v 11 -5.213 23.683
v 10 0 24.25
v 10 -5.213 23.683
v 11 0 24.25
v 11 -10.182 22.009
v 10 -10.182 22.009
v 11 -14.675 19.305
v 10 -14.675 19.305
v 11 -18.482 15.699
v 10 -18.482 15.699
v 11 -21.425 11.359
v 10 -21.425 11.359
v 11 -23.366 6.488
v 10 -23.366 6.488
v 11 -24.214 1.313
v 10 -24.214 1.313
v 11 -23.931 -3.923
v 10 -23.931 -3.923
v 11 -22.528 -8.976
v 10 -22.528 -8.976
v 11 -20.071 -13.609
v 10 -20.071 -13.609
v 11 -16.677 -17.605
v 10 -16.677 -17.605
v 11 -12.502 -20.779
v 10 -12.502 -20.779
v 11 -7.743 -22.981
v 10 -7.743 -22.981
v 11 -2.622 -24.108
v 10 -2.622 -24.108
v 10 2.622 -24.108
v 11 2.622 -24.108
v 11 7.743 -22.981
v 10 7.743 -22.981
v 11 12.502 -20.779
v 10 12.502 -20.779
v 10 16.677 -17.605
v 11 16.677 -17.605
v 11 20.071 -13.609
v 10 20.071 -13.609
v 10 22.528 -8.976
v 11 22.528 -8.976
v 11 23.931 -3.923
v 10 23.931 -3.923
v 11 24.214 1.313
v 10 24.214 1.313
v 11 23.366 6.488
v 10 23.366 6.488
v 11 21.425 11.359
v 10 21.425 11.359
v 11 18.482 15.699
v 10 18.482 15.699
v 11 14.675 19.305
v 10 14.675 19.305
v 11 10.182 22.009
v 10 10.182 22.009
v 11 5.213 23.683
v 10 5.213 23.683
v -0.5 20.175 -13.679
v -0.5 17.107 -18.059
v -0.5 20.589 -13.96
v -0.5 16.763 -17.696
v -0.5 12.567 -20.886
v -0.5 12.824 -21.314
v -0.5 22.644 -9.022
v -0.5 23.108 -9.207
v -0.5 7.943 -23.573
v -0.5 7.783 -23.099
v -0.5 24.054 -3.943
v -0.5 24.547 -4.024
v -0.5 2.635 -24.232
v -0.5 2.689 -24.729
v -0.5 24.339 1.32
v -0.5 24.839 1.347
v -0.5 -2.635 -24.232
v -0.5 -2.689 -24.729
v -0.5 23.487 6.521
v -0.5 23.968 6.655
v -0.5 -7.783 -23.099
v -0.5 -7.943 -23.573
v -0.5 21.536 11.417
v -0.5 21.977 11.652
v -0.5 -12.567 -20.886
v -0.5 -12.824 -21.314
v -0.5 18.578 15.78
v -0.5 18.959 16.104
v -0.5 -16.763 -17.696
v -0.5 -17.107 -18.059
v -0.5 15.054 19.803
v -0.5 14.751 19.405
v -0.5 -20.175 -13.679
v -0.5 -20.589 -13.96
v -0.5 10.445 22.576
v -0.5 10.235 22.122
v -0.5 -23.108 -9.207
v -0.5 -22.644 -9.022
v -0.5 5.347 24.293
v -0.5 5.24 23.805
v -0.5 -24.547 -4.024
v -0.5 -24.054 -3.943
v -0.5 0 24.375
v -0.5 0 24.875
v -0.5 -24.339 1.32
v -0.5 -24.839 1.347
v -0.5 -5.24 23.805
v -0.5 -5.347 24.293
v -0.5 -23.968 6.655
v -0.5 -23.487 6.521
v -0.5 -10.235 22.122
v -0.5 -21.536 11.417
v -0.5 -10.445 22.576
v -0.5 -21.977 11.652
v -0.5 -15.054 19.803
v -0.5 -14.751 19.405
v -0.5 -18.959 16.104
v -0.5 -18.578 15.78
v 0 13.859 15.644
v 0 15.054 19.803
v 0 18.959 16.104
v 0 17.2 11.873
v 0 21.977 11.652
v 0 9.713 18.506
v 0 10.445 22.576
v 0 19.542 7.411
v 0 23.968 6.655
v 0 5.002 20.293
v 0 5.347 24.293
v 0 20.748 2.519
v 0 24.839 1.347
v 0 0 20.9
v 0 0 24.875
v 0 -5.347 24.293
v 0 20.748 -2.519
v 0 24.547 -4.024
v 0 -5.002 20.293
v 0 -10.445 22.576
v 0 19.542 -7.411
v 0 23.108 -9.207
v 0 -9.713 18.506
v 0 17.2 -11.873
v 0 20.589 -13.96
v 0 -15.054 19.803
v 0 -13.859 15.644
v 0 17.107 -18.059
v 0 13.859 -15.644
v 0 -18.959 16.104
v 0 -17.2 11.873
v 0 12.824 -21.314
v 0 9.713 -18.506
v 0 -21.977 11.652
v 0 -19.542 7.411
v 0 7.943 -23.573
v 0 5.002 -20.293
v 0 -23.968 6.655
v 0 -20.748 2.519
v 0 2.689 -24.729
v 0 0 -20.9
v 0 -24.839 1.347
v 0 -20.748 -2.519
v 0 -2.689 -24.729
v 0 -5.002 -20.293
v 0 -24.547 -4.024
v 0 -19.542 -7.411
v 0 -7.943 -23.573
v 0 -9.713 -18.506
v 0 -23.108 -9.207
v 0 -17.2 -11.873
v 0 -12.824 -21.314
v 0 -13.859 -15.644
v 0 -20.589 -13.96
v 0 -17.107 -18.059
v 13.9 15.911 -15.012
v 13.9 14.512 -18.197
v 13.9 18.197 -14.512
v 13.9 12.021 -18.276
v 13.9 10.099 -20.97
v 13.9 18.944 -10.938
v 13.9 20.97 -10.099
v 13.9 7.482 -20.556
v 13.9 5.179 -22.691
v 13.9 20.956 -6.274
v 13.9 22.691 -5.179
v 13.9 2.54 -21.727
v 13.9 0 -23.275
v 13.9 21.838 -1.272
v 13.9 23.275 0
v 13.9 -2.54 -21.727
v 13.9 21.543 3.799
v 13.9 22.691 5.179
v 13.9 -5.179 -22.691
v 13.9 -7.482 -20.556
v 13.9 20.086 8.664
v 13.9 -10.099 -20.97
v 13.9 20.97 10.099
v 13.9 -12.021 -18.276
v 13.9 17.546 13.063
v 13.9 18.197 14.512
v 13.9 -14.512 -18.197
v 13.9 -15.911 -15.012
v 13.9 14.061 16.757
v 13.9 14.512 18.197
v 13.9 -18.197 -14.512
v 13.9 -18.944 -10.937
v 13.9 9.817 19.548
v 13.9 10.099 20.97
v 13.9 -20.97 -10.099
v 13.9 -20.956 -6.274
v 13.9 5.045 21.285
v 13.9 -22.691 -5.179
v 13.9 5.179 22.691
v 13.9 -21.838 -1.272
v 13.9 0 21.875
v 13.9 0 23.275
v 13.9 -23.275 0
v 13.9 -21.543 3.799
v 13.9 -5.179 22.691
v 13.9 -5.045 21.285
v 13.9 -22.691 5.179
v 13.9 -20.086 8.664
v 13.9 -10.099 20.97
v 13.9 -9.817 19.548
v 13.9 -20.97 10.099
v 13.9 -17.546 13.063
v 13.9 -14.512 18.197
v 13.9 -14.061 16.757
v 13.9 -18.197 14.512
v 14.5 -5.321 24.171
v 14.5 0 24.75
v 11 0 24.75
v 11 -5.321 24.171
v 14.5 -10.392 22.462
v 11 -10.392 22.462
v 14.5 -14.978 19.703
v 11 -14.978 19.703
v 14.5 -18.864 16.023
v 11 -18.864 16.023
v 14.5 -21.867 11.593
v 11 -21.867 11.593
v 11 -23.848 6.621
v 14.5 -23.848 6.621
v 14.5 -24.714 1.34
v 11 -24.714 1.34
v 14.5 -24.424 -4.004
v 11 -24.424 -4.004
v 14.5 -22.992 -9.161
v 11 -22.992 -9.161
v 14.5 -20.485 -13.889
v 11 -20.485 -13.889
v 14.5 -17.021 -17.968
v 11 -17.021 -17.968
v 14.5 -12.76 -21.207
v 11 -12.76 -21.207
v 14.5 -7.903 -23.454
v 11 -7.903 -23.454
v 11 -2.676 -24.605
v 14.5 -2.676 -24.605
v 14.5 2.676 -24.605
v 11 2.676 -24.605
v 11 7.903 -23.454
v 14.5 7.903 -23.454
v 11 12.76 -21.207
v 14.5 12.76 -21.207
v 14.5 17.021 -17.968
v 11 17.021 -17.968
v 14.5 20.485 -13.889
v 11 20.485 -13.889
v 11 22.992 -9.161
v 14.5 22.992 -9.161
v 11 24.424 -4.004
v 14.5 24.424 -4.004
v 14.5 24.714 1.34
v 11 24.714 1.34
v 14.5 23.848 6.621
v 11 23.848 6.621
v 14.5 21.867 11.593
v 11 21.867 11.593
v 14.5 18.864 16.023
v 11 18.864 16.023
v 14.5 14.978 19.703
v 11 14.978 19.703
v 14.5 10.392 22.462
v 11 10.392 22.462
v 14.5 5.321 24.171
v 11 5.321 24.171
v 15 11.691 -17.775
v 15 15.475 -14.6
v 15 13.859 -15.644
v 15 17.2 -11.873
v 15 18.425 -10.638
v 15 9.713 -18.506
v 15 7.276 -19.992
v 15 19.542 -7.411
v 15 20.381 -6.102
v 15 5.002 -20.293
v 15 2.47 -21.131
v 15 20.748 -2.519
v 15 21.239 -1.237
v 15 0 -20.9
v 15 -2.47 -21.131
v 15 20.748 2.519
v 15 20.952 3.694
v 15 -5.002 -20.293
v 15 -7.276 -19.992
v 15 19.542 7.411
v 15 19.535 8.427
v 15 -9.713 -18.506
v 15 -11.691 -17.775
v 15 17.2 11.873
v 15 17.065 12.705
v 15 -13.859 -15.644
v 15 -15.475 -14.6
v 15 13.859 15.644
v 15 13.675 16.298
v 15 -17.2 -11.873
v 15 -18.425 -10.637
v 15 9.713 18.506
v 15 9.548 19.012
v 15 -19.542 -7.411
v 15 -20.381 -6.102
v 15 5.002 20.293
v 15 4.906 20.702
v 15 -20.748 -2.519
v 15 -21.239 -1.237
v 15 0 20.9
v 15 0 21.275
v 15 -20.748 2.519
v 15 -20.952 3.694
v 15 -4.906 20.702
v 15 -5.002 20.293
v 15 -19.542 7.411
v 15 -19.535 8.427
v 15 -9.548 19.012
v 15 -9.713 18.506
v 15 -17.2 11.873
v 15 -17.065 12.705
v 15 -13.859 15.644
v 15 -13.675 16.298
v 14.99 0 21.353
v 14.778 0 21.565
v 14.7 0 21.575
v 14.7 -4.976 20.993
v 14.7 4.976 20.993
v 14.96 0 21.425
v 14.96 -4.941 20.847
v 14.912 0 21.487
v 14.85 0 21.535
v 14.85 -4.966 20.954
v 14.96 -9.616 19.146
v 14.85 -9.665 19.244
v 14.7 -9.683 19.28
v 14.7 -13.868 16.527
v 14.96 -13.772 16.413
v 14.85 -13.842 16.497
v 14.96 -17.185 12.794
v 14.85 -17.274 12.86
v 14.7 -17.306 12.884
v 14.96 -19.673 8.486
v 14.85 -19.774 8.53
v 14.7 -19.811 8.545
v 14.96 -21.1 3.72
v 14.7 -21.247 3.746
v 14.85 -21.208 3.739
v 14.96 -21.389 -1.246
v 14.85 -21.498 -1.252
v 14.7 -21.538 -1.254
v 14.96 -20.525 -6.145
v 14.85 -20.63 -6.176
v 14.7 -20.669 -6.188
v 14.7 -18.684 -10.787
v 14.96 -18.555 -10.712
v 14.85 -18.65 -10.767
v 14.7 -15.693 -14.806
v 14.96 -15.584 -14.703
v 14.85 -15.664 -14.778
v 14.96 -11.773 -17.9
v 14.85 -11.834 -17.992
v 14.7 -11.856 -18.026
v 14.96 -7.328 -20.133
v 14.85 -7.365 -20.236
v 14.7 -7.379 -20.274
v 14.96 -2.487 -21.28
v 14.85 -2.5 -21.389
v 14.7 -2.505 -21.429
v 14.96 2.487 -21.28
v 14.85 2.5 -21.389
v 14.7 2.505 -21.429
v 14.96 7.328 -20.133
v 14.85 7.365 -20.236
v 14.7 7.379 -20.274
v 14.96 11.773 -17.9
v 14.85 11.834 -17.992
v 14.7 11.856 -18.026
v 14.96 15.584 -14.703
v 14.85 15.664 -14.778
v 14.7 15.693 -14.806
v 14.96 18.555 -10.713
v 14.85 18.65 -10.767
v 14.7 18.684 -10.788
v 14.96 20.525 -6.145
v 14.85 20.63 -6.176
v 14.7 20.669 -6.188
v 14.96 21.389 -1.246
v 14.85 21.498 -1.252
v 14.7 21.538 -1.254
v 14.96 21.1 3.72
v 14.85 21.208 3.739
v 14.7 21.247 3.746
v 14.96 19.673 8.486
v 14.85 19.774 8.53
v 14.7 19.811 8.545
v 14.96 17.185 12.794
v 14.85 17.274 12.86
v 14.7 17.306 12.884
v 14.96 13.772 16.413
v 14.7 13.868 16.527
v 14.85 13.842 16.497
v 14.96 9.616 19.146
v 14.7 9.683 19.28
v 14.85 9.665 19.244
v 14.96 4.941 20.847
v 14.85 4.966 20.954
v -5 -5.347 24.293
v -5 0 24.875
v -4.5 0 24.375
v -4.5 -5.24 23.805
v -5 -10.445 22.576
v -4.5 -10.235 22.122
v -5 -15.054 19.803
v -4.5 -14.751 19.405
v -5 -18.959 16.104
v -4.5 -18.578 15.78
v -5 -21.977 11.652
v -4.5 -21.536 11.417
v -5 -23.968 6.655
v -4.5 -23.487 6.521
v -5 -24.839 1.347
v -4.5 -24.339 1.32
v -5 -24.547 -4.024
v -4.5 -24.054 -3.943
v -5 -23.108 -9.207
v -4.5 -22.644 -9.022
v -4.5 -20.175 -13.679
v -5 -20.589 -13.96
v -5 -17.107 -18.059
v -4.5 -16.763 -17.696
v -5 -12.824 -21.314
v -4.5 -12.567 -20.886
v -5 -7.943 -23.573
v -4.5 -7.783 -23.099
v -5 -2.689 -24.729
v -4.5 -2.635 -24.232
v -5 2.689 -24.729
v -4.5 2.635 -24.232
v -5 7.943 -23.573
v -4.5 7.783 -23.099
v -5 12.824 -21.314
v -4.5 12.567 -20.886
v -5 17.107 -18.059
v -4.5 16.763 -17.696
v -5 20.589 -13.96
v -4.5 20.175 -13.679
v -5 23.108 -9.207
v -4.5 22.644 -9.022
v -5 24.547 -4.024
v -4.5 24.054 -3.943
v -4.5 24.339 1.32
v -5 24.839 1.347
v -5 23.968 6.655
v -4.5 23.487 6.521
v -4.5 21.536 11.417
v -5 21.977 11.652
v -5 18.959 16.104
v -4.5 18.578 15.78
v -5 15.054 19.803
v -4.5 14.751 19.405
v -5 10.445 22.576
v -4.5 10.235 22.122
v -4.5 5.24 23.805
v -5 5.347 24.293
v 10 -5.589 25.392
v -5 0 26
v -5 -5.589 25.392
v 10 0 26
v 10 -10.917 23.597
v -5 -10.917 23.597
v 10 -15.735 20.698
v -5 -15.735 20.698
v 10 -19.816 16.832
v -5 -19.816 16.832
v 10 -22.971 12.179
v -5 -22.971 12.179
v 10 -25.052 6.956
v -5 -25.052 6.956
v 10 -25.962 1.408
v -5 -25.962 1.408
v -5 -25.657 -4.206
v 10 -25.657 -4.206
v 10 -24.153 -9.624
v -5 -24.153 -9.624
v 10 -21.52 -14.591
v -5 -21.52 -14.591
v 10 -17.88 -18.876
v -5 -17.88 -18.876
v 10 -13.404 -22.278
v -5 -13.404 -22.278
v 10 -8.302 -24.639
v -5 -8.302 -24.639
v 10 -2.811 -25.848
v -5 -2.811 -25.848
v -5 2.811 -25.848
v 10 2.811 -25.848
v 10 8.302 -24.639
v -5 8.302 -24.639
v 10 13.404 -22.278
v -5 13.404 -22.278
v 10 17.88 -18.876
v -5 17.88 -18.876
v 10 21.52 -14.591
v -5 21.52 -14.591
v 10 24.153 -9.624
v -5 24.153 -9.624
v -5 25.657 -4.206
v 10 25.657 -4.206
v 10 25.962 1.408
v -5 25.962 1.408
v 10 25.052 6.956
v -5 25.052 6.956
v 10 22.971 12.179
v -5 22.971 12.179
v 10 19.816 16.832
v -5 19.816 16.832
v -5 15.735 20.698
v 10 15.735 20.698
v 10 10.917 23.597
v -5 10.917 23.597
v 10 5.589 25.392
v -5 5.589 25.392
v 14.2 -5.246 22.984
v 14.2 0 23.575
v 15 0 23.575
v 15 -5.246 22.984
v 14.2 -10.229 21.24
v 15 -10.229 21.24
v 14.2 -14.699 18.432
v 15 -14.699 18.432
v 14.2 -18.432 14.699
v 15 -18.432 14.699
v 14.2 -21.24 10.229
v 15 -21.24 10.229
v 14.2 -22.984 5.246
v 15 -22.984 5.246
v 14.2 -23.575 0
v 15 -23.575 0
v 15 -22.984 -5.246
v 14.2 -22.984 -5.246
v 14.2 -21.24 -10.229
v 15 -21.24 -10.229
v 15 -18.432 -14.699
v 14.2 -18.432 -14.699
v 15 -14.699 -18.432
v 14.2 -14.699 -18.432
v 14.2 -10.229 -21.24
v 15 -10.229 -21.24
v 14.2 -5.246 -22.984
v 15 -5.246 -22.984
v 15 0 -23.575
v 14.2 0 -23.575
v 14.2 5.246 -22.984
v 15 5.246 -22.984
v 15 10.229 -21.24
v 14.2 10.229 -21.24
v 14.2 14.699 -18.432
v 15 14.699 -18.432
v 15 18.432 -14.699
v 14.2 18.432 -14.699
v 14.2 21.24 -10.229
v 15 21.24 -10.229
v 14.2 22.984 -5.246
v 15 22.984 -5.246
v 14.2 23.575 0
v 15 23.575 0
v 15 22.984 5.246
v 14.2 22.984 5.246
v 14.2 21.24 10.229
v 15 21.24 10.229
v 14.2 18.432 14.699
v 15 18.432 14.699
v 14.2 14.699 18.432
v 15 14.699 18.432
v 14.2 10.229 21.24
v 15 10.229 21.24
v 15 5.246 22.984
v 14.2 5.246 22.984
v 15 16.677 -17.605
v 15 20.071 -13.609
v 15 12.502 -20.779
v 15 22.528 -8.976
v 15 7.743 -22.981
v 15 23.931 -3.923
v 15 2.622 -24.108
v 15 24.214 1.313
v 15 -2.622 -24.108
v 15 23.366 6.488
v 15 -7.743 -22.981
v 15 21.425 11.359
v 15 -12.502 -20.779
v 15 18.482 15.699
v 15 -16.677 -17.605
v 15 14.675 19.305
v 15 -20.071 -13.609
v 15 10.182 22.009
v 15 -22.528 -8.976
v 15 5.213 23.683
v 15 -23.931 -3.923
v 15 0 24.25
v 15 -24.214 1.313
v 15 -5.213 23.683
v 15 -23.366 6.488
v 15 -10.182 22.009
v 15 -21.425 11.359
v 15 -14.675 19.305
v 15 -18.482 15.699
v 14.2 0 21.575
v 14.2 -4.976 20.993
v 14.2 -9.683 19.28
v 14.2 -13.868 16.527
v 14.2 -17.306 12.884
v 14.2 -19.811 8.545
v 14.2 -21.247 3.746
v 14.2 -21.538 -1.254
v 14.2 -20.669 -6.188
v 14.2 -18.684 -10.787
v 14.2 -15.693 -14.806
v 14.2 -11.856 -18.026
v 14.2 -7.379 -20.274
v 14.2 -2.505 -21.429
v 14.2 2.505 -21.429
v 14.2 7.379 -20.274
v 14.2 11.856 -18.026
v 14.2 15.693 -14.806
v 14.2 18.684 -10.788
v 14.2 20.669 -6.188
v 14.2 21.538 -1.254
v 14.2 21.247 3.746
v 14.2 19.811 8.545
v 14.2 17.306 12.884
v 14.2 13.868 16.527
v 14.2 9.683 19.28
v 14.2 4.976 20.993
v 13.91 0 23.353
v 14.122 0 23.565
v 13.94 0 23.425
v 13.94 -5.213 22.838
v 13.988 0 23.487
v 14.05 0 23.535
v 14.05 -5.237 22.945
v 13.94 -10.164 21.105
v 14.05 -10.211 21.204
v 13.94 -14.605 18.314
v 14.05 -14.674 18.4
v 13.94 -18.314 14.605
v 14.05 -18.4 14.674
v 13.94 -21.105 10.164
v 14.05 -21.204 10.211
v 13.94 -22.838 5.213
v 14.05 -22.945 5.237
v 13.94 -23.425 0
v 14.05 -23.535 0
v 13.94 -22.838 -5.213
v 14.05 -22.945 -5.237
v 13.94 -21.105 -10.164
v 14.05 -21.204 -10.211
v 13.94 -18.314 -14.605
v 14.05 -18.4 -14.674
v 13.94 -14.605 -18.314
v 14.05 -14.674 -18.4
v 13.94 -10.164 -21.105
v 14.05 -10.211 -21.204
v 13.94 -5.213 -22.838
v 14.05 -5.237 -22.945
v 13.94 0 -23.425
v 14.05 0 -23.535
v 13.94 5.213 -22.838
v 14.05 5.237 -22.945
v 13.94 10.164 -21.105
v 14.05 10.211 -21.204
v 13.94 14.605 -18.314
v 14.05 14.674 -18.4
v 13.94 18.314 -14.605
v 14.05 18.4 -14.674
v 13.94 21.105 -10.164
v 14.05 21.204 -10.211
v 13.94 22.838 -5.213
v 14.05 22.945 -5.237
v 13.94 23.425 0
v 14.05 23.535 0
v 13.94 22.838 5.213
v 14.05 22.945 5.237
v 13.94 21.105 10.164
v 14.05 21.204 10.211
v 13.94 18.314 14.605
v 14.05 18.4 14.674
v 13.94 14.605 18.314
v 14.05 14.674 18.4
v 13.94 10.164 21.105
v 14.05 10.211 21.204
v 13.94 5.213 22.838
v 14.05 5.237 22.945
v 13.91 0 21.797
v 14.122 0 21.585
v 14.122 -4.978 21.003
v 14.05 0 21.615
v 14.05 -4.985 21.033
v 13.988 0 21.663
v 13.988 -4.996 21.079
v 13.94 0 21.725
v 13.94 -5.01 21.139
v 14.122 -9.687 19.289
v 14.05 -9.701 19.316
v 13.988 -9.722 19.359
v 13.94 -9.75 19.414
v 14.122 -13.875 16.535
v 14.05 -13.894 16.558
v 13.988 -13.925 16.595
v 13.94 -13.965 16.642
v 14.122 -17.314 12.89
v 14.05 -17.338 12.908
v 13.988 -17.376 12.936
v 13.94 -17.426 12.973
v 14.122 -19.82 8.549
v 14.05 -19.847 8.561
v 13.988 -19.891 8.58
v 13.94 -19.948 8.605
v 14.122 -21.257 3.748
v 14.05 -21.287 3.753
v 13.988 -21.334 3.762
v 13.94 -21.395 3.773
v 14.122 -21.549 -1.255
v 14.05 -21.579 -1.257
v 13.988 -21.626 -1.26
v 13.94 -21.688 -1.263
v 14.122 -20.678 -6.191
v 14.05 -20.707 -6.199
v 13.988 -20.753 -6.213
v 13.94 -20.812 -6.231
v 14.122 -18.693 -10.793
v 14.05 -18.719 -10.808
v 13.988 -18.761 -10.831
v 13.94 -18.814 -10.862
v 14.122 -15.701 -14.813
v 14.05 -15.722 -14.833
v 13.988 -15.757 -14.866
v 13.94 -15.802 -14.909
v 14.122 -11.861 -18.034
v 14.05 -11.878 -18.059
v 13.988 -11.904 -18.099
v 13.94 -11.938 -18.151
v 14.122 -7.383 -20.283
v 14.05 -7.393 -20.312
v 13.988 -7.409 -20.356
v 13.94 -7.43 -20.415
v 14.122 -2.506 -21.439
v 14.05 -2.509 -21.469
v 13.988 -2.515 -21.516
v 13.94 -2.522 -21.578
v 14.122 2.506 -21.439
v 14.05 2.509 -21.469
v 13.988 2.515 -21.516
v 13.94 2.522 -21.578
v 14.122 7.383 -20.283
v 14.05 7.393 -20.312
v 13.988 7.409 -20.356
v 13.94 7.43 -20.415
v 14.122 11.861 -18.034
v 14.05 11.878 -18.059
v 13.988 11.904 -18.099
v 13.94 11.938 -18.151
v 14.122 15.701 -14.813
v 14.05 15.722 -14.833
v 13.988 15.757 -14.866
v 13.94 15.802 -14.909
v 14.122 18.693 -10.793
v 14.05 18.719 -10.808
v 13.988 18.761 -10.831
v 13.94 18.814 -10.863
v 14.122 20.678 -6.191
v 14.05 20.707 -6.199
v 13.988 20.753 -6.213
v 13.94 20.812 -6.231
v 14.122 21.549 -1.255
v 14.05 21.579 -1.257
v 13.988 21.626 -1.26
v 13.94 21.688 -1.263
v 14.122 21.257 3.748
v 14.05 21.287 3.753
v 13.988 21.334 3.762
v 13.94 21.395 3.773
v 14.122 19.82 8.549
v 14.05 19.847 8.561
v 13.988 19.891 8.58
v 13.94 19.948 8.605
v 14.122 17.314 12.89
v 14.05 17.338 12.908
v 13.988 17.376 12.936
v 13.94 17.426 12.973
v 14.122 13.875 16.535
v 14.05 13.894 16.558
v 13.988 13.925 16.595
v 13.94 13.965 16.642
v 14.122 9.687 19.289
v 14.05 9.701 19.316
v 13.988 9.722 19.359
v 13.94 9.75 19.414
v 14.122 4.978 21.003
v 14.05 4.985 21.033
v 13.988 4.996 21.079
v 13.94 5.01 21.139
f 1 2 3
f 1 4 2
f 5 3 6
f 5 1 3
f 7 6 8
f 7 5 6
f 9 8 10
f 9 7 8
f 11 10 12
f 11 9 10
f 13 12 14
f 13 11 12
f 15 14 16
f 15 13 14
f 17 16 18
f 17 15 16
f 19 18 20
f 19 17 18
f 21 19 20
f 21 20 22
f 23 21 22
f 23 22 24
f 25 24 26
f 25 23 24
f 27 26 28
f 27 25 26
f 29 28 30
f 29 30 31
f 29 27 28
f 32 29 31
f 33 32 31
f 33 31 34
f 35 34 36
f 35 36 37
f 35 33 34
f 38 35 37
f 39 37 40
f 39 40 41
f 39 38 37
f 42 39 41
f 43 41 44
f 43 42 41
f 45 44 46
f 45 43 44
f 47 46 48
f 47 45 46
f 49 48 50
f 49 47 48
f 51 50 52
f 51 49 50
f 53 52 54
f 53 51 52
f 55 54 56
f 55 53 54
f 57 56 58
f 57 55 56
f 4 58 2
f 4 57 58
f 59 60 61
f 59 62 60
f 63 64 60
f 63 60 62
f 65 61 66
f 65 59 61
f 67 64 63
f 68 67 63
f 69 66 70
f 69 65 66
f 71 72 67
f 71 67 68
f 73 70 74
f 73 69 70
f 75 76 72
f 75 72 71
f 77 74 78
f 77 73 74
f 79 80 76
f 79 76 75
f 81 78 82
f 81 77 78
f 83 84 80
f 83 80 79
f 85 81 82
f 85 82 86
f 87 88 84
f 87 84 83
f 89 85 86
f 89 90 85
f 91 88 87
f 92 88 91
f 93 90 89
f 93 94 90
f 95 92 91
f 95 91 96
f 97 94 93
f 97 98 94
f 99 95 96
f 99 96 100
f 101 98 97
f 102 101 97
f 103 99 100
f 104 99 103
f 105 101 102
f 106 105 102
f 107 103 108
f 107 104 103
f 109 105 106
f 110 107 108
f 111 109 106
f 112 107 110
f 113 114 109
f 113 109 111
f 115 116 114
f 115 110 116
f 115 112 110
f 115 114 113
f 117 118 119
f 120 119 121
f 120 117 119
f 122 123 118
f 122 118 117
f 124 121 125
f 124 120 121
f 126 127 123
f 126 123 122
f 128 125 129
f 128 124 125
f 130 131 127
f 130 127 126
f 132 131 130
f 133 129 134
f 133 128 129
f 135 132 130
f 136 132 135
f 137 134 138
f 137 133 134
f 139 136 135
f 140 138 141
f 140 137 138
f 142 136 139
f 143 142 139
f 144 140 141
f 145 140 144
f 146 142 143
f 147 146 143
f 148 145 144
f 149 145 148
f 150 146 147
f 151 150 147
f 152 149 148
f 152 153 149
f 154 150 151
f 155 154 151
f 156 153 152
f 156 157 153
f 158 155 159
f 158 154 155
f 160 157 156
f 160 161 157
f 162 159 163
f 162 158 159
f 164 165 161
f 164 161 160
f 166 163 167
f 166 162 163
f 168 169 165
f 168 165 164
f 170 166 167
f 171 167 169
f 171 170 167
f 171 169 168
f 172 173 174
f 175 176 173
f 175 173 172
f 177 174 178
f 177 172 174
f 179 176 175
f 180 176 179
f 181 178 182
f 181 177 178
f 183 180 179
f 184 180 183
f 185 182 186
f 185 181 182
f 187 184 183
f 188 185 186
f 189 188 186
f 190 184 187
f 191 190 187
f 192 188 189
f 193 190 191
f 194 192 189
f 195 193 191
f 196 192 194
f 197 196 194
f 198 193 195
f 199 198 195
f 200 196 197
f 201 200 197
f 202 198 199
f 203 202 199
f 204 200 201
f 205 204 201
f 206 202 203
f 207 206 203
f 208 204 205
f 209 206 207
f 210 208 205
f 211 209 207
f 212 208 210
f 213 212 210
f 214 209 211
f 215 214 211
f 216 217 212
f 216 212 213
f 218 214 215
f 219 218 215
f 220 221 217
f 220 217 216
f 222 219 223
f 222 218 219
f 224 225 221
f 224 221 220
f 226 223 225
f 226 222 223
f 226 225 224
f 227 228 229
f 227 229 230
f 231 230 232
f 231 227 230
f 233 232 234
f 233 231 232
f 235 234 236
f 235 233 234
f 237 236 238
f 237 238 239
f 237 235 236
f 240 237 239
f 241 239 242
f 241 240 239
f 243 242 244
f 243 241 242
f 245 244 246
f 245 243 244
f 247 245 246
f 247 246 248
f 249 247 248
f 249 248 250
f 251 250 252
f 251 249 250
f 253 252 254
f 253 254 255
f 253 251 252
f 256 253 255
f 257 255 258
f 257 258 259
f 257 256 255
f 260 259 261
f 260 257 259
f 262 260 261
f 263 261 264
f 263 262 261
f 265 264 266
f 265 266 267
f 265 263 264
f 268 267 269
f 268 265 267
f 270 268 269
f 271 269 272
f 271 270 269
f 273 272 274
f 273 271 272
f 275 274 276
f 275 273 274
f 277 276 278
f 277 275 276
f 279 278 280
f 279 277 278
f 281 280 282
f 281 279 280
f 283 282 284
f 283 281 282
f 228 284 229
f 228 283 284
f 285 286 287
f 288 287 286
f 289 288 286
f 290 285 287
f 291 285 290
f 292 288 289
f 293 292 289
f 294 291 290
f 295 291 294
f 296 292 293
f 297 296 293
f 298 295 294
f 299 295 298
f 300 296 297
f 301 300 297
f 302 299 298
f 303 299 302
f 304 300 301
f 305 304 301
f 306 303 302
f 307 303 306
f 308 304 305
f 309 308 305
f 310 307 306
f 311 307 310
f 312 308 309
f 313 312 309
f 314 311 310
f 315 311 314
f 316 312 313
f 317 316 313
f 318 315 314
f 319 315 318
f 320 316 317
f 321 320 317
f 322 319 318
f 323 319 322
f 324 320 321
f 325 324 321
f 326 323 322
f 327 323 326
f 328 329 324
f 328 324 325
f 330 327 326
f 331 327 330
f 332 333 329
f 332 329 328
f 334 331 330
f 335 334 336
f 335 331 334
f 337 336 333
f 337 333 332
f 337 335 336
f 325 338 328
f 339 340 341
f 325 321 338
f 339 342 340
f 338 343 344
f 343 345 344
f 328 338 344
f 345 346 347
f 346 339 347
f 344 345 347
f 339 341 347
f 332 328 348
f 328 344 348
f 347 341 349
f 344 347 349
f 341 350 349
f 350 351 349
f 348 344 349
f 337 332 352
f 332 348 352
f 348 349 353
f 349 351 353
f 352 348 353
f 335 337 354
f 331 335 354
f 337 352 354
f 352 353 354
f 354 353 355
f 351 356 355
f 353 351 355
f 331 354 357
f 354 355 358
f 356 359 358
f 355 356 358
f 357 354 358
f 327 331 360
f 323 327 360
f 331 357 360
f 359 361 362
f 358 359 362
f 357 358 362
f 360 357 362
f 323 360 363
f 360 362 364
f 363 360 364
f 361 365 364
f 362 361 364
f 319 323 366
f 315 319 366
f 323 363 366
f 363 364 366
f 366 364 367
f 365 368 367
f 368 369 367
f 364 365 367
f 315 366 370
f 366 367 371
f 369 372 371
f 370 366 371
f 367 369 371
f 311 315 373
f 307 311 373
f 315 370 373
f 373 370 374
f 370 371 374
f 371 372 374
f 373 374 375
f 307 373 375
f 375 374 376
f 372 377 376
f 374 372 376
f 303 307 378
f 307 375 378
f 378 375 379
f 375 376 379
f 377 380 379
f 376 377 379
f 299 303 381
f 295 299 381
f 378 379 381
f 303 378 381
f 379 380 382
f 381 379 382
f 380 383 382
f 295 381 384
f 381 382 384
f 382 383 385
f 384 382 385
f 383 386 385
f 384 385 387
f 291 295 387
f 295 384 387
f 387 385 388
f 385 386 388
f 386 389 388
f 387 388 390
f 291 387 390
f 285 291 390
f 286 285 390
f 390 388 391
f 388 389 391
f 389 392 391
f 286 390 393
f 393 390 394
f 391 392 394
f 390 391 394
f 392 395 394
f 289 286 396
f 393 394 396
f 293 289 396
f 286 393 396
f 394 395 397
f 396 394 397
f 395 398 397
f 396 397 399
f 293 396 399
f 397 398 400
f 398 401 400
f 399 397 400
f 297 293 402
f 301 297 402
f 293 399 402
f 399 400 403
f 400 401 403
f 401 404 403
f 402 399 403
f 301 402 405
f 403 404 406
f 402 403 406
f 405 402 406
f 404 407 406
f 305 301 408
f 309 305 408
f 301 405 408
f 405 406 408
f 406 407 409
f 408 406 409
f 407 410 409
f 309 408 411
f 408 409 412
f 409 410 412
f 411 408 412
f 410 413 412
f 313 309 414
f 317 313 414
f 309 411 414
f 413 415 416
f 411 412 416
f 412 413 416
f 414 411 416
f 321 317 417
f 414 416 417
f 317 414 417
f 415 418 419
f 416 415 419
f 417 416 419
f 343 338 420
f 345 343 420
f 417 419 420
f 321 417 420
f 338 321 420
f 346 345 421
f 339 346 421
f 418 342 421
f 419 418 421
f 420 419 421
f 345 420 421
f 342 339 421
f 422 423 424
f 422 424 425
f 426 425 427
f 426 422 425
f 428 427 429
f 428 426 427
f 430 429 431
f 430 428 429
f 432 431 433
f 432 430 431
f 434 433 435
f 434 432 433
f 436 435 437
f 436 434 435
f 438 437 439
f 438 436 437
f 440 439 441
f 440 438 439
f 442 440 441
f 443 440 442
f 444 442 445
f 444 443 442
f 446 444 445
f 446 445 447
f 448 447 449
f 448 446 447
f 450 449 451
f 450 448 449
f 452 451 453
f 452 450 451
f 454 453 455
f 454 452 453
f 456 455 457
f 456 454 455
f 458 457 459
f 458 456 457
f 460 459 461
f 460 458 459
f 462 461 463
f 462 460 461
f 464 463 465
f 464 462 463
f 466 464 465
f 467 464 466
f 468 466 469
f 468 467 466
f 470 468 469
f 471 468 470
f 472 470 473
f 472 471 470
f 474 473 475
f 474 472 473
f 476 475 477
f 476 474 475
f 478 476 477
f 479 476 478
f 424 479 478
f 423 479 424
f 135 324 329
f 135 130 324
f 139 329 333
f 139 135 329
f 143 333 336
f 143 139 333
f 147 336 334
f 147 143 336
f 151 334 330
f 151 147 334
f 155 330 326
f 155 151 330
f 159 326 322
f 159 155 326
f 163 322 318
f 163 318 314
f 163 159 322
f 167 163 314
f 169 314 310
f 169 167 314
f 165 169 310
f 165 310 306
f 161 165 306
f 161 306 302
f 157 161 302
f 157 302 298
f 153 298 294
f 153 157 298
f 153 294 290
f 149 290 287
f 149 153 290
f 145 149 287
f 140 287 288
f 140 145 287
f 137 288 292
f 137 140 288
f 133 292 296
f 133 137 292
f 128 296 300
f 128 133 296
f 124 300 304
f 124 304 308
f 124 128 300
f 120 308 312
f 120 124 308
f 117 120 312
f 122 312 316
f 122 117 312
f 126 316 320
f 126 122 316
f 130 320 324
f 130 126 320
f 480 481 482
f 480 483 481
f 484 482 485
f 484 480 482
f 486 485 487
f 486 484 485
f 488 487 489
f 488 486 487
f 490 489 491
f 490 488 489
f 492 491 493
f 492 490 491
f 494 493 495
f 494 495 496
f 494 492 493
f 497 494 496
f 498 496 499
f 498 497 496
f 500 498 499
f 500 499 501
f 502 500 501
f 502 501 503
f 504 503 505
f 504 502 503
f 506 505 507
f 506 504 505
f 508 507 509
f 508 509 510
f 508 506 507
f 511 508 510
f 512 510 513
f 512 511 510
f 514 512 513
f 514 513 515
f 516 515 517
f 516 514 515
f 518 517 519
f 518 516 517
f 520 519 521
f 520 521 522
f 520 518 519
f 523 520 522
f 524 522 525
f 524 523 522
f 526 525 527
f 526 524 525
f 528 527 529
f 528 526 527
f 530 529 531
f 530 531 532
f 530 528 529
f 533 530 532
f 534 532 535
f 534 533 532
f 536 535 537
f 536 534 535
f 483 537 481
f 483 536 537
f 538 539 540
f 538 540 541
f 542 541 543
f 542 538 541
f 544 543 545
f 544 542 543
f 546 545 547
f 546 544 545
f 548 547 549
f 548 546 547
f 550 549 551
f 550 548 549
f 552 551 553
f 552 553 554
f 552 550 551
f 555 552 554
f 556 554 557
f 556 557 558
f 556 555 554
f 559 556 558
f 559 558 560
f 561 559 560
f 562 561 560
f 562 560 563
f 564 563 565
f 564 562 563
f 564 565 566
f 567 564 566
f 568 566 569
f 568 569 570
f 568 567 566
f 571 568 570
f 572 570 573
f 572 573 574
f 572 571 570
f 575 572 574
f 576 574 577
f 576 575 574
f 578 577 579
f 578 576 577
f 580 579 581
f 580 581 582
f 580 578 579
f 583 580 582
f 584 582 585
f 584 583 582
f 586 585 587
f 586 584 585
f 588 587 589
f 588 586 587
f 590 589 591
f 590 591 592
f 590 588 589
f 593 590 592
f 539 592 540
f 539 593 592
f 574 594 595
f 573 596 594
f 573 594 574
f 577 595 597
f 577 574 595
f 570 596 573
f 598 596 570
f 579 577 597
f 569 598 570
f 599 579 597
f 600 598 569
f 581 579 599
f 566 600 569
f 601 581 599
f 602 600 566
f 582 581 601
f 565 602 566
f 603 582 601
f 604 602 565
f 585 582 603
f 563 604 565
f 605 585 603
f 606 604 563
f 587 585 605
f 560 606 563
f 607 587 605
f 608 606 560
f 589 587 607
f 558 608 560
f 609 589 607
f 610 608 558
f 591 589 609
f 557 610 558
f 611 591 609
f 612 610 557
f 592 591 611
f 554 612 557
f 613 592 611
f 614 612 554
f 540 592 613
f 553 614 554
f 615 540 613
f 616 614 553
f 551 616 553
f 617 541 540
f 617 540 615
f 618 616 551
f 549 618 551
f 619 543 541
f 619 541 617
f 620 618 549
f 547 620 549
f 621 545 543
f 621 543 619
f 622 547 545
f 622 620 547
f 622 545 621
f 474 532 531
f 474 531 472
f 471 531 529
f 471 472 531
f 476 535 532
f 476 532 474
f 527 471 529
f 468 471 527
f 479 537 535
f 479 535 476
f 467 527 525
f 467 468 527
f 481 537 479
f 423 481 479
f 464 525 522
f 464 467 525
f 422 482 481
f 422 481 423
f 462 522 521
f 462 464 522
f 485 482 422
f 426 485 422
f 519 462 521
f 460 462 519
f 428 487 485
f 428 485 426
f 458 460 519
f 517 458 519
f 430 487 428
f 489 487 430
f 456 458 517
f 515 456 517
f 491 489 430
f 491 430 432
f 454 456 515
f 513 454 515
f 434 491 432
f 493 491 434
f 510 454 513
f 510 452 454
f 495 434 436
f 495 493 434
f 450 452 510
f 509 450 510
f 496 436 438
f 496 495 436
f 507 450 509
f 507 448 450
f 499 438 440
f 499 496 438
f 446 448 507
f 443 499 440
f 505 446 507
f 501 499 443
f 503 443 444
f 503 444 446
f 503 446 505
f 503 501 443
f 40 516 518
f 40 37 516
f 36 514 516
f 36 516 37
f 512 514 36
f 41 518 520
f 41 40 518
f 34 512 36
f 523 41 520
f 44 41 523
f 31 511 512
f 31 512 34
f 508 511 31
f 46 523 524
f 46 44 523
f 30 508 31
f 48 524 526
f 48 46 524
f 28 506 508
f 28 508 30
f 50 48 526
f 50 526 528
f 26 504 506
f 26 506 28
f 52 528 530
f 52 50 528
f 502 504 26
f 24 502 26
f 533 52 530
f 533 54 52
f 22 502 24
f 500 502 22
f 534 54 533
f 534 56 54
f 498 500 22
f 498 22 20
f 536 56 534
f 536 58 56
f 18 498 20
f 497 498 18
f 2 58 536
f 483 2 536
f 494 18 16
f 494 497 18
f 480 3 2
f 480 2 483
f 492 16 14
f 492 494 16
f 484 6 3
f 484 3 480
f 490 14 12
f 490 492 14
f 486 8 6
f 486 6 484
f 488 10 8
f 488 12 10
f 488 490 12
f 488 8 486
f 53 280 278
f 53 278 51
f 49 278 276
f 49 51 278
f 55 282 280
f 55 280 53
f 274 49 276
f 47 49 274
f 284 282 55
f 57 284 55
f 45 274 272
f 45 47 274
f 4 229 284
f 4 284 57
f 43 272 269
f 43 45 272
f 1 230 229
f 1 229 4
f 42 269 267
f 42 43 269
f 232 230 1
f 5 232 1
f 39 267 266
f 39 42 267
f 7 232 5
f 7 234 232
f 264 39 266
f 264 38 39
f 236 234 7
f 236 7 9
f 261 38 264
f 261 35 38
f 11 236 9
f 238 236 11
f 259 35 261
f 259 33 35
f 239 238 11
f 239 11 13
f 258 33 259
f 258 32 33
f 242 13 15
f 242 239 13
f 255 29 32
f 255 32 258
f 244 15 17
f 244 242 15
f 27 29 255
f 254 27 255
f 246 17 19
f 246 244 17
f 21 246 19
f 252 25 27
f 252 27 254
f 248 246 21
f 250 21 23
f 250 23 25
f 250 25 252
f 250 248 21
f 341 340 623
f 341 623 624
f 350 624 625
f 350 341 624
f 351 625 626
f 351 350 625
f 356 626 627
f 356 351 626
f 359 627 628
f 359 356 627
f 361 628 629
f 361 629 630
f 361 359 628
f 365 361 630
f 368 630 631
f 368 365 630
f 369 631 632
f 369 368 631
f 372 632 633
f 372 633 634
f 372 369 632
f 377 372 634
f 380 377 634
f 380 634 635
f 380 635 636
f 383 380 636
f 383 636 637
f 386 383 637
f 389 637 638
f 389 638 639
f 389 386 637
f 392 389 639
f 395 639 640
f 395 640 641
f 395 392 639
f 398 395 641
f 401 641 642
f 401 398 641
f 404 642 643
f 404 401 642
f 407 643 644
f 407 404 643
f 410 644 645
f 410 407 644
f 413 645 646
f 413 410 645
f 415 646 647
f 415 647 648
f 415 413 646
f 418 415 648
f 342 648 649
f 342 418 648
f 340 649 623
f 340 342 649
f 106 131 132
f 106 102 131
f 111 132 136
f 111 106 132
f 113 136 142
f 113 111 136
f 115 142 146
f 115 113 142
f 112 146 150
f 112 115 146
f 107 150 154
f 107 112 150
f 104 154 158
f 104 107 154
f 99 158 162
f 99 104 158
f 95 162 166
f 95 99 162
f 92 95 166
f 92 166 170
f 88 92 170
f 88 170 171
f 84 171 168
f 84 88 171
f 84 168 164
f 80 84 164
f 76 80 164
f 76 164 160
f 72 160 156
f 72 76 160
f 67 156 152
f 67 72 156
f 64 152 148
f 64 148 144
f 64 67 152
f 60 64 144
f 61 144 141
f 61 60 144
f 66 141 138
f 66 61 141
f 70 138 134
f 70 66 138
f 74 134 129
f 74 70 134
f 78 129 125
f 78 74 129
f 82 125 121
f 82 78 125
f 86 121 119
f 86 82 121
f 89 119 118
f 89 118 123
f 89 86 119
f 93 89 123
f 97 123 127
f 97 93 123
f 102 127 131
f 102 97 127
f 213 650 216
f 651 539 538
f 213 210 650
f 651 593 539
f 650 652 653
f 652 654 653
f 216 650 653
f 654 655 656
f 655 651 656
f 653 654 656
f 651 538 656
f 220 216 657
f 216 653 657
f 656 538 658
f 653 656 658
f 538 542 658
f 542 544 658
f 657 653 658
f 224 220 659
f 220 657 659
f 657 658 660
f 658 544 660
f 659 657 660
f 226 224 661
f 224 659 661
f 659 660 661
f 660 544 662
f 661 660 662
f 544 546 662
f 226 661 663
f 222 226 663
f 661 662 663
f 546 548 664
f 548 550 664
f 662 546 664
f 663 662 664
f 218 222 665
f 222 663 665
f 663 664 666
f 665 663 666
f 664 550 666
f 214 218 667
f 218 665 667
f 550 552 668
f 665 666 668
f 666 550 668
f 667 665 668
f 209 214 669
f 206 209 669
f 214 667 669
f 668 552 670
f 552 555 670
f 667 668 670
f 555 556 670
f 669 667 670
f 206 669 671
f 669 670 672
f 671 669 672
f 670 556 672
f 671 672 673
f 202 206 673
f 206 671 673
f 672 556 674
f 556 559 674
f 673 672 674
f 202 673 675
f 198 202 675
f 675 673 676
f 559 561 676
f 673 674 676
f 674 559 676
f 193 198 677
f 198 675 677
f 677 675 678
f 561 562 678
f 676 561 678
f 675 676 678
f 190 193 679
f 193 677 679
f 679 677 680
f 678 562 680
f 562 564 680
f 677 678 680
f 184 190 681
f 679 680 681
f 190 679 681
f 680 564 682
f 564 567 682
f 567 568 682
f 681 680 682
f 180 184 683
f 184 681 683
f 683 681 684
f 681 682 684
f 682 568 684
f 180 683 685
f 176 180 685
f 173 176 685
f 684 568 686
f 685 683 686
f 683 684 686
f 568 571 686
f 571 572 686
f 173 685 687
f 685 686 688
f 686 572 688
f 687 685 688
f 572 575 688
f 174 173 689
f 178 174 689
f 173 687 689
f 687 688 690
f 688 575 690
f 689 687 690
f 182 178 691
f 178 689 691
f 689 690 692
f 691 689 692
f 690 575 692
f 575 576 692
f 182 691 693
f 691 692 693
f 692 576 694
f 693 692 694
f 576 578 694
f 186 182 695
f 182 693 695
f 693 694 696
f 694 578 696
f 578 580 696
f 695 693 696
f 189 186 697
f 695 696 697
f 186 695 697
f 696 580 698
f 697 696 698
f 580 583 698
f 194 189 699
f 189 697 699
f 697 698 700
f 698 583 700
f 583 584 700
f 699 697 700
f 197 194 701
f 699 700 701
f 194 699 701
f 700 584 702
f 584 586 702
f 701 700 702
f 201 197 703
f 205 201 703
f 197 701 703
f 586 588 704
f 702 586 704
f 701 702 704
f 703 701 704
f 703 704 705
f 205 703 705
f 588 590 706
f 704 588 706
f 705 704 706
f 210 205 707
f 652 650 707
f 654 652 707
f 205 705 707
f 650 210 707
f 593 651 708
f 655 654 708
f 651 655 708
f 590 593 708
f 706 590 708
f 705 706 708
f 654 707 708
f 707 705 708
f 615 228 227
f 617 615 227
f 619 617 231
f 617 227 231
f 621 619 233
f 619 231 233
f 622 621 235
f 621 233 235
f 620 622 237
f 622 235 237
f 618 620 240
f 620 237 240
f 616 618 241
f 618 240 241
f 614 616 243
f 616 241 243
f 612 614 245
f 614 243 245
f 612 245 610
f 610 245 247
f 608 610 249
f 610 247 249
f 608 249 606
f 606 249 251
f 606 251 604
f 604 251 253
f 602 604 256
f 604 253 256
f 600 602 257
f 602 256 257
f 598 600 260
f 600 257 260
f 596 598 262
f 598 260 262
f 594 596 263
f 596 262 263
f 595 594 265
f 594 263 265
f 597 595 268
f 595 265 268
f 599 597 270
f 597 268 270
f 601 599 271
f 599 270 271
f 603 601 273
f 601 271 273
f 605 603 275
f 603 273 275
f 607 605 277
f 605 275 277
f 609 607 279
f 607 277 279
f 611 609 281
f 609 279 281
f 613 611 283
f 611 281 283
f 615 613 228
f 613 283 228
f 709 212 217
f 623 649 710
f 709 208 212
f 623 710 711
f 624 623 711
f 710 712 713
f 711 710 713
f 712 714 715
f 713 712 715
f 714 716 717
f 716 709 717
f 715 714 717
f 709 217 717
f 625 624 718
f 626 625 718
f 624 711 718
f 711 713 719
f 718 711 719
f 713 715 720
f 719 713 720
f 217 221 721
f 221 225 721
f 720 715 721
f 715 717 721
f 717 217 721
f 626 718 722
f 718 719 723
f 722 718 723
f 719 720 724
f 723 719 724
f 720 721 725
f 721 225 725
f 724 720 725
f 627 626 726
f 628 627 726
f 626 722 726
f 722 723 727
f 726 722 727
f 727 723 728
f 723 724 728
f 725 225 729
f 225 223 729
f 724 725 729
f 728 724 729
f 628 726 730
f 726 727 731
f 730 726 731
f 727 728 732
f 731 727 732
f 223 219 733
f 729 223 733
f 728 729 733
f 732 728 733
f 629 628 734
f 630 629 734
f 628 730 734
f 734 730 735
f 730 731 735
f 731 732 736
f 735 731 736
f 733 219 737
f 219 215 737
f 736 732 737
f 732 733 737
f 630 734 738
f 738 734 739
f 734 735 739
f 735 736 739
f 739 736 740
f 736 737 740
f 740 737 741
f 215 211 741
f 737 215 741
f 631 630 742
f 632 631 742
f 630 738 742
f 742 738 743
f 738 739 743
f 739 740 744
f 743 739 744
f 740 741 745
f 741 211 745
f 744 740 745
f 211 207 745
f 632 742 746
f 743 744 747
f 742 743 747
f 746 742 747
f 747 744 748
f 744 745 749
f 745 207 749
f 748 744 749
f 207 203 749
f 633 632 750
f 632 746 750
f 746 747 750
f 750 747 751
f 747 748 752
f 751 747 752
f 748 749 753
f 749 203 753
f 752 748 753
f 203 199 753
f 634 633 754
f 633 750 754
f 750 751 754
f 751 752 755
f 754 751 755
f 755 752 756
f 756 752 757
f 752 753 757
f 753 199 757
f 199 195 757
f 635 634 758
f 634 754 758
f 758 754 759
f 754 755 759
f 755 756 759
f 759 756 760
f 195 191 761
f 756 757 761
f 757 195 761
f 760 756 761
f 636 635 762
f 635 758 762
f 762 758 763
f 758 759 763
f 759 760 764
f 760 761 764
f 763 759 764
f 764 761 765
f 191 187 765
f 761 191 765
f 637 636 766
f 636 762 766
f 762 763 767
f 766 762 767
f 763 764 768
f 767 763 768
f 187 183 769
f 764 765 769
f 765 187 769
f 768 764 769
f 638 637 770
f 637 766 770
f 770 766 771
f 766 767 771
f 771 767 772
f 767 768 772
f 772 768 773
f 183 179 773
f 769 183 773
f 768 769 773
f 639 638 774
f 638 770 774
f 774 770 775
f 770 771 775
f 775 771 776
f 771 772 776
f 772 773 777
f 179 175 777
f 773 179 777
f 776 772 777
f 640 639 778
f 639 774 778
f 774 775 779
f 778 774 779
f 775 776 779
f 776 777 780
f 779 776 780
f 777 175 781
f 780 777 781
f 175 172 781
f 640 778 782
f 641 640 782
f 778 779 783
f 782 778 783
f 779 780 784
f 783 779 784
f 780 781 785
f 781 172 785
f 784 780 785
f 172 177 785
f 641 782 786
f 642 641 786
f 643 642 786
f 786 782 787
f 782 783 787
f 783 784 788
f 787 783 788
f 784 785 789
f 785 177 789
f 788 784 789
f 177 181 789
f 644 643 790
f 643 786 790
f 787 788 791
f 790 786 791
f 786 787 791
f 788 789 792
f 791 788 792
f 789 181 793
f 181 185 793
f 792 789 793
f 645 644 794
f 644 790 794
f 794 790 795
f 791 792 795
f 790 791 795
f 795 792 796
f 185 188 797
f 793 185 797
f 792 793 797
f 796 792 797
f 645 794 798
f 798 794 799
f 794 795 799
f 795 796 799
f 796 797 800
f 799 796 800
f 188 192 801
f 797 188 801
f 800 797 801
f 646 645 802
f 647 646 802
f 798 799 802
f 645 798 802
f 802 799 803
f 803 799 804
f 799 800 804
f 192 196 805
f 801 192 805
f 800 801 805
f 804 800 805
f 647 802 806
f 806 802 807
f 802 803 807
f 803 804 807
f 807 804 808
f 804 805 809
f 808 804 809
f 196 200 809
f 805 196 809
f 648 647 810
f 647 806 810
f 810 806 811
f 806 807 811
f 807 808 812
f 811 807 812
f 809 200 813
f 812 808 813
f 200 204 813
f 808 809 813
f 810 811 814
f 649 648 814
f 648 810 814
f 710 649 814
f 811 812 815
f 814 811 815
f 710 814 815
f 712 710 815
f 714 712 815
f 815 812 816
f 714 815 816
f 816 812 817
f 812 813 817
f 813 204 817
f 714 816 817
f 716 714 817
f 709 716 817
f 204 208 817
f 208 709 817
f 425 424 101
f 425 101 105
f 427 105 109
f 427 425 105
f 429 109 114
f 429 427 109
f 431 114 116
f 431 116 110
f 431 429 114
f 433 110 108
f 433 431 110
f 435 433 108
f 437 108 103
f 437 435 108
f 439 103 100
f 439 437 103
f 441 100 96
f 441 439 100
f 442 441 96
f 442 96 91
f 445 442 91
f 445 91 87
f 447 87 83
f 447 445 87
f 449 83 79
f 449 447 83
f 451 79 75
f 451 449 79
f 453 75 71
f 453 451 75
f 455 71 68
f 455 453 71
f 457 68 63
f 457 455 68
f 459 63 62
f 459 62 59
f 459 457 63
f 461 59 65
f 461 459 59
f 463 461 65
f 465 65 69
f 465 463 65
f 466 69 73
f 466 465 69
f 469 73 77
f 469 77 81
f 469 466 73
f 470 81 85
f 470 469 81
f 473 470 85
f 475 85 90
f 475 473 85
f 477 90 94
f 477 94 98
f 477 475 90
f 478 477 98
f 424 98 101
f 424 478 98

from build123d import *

# Parameters (mm, degrees)
SMUSSO1_SIZE = 0.5
RACCORDO1_R  = 0.3
SMUSSO2_SIZE = 0.5


with BuildPart() as part:
    # Schizzo1 → Rivoluzione1 (revolve)
    with BuildSketch(Plane.XY, mode=Mode.PRIVATE) as rivoluzione1_sk:
        Polygon((-5, 26), (10, 26), (10, 24.25), (11, 24.25), (11, 24.75), (15, 24.75), (15, 23.575), (13.9, 23.575), (13.9, 21.575), (15, 21.575), (15, 20.9), (0, 20.9), (0, 24.875), (-0.5, 24.875), (-0.5, 24.375), (-5, 24.375), align=None)
    revolve(rivoluzione1_sk.sketch.rotate(Axis((0, 0, 0), (1, 0, 0)), 90), axis=Axis((0, 0, 0), (1, 0, 0)))  # turned: the seam where the file's is

    # Smusso1
    smusso1_edges = [part.edges().sort_by_distance(p)[0] for p in [
        (-5, 0, -24.375),
    ]]
    chamfer(smusso1_edges, length=SMUSSO1_SIZE)

    # Raccordo1
    raccordo1_edges = [part.edges().sort_by_distance(p)[0] for p in [
        (13.9, 0, -23.575),
        (13.9, 0, -21.575),
        (15, 0, -21.575),
    ]]
    fillet(raccordo1_edges, radius=RACCORDO1_R)

    # Smusso2
    smusso2_edges = [part.edges().sort_by_distance(p)[0] for p in [
        (15, 0, -24.75),
    ]]
    chamfer(smusso2_edges, length=SMUSSO2_SIZE)


solid = part.part
